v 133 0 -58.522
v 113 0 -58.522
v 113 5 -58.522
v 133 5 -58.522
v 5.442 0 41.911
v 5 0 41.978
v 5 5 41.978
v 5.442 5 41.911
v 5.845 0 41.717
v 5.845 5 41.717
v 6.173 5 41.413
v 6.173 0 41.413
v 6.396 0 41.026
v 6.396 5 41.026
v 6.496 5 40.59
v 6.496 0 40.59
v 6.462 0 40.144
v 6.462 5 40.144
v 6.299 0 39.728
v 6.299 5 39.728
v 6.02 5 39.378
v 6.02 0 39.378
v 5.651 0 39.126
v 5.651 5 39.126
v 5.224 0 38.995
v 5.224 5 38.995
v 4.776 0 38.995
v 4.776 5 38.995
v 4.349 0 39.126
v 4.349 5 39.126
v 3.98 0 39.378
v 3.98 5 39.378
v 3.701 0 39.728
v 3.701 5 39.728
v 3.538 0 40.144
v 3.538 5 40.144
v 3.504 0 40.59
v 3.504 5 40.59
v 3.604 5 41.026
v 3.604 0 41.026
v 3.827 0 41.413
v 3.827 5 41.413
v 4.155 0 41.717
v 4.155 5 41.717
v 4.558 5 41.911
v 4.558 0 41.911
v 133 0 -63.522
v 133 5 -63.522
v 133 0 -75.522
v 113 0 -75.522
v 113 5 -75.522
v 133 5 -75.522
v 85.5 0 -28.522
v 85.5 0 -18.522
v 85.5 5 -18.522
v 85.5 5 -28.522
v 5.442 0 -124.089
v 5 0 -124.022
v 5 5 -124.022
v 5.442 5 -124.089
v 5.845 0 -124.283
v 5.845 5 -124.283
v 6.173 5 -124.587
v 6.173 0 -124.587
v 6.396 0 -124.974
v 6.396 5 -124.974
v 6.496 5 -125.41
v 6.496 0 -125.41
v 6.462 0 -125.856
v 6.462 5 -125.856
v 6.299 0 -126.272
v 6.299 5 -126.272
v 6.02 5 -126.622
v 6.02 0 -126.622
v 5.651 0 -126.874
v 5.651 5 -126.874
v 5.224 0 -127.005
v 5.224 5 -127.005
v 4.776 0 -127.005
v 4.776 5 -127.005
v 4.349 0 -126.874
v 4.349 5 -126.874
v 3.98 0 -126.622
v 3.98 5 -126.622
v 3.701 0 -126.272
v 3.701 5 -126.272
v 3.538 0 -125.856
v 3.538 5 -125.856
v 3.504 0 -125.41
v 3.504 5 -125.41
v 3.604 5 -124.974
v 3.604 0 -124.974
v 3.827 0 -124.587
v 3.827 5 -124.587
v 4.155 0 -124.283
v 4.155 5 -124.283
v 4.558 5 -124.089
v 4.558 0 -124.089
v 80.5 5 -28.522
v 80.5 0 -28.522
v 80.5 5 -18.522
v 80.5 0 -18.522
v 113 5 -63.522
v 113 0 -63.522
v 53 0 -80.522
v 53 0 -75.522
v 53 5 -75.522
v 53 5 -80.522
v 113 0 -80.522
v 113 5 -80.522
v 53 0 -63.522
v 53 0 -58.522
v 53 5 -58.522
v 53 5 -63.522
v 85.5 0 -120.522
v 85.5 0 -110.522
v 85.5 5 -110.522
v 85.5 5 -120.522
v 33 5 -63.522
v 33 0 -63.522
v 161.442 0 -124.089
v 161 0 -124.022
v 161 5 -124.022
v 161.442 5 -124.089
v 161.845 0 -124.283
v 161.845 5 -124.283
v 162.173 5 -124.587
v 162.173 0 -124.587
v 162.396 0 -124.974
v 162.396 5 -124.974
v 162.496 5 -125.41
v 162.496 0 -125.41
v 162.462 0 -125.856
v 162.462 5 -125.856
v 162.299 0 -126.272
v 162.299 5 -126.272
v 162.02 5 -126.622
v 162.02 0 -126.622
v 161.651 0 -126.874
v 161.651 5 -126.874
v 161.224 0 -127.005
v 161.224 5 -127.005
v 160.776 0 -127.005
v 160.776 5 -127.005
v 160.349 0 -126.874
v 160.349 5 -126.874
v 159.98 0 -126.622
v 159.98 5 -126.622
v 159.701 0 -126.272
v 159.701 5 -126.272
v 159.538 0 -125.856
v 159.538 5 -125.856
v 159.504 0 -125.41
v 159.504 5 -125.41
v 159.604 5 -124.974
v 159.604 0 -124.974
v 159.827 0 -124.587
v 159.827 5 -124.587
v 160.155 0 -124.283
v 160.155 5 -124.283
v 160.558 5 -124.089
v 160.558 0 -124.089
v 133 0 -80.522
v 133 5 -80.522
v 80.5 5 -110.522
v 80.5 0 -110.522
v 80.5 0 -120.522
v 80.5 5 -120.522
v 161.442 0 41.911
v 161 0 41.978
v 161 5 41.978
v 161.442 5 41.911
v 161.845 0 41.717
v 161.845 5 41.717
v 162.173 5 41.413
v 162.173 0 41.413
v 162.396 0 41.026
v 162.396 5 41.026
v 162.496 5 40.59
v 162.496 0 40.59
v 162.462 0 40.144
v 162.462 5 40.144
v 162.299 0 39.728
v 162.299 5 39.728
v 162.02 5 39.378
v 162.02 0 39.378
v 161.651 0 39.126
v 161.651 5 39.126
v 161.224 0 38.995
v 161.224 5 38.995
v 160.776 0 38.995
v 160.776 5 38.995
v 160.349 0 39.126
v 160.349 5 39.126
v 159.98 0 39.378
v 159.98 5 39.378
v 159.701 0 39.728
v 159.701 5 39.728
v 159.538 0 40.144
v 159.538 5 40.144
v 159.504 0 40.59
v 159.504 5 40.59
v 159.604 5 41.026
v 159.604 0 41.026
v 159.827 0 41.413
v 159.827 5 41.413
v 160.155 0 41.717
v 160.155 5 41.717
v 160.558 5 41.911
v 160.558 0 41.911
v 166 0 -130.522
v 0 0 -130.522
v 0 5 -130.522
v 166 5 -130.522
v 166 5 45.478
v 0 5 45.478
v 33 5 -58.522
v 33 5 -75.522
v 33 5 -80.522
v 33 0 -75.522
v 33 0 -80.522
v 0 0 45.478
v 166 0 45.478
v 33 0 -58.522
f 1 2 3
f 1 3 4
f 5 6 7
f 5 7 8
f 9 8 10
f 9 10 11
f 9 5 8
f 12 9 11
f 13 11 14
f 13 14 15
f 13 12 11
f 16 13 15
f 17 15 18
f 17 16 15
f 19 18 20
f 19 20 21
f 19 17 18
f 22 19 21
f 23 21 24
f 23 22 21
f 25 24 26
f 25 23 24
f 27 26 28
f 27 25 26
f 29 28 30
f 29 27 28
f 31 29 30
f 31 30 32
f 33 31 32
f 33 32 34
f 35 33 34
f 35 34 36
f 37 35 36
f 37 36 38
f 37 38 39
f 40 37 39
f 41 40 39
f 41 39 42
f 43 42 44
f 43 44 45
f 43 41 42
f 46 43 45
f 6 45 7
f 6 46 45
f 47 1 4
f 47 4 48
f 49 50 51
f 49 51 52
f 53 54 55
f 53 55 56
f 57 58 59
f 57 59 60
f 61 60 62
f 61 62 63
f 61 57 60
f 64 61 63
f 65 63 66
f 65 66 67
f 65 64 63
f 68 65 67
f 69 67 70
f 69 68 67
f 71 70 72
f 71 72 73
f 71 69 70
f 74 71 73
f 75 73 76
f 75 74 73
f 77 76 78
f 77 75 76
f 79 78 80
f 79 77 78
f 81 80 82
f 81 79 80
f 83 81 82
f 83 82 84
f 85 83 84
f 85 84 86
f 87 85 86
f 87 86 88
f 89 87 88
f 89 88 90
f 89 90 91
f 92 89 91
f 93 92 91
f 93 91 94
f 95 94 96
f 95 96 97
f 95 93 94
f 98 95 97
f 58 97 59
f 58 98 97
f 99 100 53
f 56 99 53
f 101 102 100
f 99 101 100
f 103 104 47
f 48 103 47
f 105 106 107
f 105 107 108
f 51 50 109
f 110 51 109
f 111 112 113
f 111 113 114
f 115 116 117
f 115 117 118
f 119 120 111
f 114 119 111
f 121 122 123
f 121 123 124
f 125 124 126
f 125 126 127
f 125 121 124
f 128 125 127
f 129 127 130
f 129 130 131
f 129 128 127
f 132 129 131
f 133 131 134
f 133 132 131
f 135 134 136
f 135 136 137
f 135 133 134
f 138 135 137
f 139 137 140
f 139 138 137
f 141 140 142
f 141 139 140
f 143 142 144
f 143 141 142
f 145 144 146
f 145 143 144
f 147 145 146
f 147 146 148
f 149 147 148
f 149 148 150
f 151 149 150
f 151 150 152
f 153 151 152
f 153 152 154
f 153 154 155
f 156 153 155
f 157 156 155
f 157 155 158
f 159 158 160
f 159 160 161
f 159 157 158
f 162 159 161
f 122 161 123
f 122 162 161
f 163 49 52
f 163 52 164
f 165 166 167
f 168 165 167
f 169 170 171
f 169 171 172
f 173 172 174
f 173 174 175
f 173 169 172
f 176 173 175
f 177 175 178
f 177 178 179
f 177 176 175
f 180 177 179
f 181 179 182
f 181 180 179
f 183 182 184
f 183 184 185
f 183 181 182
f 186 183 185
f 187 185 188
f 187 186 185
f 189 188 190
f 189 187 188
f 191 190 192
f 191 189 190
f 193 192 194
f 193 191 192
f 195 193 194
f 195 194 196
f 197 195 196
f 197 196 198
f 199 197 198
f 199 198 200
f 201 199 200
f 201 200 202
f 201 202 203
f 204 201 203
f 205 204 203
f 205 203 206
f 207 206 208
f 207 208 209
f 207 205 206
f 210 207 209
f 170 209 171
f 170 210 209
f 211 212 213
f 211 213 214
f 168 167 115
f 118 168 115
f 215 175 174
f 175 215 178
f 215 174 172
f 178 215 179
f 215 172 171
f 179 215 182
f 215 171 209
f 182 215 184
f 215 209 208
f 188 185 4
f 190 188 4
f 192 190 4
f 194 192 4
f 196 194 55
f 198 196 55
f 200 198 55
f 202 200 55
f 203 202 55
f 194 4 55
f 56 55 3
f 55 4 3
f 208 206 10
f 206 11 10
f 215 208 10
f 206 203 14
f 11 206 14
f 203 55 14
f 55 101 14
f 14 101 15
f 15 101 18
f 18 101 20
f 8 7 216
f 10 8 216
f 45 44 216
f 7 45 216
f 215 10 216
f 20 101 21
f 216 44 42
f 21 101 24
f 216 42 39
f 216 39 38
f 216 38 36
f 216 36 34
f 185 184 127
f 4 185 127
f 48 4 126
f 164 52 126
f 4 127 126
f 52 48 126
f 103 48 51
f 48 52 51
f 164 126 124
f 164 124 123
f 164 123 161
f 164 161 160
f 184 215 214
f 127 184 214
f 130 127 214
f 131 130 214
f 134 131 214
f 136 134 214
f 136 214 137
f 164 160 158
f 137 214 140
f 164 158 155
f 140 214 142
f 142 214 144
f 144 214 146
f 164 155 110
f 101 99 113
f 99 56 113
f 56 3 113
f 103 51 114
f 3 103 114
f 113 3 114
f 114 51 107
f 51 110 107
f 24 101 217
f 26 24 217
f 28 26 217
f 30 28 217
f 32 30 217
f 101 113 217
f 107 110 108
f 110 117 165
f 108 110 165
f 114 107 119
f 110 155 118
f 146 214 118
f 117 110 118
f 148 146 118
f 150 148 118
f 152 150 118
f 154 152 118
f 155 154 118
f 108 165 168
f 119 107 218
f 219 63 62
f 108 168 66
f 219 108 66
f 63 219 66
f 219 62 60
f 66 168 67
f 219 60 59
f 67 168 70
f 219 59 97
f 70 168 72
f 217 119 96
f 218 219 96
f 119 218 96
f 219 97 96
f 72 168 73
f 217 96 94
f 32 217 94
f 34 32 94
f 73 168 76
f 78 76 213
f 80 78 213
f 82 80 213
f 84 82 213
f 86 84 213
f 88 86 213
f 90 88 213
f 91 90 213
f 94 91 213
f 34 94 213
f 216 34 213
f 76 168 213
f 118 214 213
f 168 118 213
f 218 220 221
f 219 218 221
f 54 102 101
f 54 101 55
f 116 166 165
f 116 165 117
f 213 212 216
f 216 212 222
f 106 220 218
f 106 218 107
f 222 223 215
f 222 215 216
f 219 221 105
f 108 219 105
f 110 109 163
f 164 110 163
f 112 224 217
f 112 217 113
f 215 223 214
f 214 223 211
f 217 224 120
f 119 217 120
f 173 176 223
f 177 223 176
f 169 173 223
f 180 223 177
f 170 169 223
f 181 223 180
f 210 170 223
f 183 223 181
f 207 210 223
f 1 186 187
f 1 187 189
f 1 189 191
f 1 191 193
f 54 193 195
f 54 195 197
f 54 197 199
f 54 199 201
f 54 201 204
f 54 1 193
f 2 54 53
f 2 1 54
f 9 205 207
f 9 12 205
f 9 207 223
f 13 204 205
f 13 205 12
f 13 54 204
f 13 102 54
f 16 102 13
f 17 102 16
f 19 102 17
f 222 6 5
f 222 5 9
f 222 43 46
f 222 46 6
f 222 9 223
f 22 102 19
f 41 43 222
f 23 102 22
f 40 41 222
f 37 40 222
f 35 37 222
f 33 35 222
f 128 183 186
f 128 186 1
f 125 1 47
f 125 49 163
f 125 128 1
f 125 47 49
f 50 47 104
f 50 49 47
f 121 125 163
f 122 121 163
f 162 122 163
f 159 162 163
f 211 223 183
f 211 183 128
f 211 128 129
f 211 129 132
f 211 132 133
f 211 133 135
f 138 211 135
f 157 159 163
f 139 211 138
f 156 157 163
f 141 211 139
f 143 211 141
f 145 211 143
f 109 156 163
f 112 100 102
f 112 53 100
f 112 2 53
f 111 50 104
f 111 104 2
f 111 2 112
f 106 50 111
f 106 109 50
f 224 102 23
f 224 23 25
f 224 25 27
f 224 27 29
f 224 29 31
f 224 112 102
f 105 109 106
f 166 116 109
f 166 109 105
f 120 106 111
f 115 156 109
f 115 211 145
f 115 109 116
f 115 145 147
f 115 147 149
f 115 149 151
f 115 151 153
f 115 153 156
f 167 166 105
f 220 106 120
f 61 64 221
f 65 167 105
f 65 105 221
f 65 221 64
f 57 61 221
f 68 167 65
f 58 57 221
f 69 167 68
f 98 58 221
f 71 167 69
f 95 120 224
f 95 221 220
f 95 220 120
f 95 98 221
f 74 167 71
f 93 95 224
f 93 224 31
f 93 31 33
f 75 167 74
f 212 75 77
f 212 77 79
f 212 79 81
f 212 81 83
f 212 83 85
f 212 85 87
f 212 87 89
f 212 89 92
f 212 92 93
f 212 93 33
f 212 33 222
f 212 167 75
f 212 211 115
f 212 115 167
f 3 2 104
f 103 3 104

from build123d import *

# Parameters (mm, degrees)
SKETCH_1_R      = 1.5
SKETCH_1_W      = 5
SKETCH_1_H      = 10
SKETCH_1_W_2    = 20
SKETCH_1_H_2    = 5
EXTRUDE_1_DEPTH = 5


with BuildPart() as part:
    # 草图1 → 凸台-拉伸1 (new body)
    with BuildSketch(Plane(origin=(0, 0, 0), x_dir=(1, 0, 0), z_dir=(0, 1, 0))):
        Polygon((0, 0), (0, 116), (0, 130.522242689), (166, 130.522242689), (166, 116), (166, 0), (166, -45.477757311), (0, -45.477757311), align=None)
        with Locations(Location((5, 125.522242689, 0), (0, 0, 270))):
            Circle(SKETCH_1_R, mode=Mode.SUBTRACT)
        with Locations(Location((161, 125.522242689, 0), (0, 0, 270))):
            Circle(SKETCH_1_R, mode=Mode.SUBTRACT)
        with Locations(Location((5, -40.477757311, 0), (0, 0, 270))):
            Circle(SKETCH_1_R, mode=Mode.SUBTRACT)
        with Locations(Location((161, -40.477757311, 0), (0, 0, 270))):
            Circle(SKETCH_1_R, mode=Mode.SUBTRACT)
        with Locations((83, 115.522242689)):
            Rectangle(SKETCH_1_W, SKETCH_1_H, mode=Mode.SUBTRACT)
        with Locations((43, 78.022242689)):
            Rectangle(SKETCH_1_W_2, SKETCH_1_H_2, mode=Mode.SUBTRACT)
        with Locations((43, 61.022242689)):
            Rectangle(SKETCH_1_W_2, SKETCH_1_H_2, mode=Mode.SUBTRACT)
        with Locations((123, 78.022242689)):
            Rectangle(SKETCH_1_W_2, SKETCH_1_H_2, mode=Mode.SUBTRACT)
        with Locations((123, 61.022242689)):
            Rectangle(SKETCH_1_W_2, SKETCH_1_H_2, mode=Mode.SUBTRACT)
        with Locations((83, 23.522242689)):
            Rectangle(SKETCH_1_W, SKETCH_1_H, mode=Mode.SUBTRACT)
    extrude(amount=EXTRUDE_1_DEPTH)


solid = part.part
